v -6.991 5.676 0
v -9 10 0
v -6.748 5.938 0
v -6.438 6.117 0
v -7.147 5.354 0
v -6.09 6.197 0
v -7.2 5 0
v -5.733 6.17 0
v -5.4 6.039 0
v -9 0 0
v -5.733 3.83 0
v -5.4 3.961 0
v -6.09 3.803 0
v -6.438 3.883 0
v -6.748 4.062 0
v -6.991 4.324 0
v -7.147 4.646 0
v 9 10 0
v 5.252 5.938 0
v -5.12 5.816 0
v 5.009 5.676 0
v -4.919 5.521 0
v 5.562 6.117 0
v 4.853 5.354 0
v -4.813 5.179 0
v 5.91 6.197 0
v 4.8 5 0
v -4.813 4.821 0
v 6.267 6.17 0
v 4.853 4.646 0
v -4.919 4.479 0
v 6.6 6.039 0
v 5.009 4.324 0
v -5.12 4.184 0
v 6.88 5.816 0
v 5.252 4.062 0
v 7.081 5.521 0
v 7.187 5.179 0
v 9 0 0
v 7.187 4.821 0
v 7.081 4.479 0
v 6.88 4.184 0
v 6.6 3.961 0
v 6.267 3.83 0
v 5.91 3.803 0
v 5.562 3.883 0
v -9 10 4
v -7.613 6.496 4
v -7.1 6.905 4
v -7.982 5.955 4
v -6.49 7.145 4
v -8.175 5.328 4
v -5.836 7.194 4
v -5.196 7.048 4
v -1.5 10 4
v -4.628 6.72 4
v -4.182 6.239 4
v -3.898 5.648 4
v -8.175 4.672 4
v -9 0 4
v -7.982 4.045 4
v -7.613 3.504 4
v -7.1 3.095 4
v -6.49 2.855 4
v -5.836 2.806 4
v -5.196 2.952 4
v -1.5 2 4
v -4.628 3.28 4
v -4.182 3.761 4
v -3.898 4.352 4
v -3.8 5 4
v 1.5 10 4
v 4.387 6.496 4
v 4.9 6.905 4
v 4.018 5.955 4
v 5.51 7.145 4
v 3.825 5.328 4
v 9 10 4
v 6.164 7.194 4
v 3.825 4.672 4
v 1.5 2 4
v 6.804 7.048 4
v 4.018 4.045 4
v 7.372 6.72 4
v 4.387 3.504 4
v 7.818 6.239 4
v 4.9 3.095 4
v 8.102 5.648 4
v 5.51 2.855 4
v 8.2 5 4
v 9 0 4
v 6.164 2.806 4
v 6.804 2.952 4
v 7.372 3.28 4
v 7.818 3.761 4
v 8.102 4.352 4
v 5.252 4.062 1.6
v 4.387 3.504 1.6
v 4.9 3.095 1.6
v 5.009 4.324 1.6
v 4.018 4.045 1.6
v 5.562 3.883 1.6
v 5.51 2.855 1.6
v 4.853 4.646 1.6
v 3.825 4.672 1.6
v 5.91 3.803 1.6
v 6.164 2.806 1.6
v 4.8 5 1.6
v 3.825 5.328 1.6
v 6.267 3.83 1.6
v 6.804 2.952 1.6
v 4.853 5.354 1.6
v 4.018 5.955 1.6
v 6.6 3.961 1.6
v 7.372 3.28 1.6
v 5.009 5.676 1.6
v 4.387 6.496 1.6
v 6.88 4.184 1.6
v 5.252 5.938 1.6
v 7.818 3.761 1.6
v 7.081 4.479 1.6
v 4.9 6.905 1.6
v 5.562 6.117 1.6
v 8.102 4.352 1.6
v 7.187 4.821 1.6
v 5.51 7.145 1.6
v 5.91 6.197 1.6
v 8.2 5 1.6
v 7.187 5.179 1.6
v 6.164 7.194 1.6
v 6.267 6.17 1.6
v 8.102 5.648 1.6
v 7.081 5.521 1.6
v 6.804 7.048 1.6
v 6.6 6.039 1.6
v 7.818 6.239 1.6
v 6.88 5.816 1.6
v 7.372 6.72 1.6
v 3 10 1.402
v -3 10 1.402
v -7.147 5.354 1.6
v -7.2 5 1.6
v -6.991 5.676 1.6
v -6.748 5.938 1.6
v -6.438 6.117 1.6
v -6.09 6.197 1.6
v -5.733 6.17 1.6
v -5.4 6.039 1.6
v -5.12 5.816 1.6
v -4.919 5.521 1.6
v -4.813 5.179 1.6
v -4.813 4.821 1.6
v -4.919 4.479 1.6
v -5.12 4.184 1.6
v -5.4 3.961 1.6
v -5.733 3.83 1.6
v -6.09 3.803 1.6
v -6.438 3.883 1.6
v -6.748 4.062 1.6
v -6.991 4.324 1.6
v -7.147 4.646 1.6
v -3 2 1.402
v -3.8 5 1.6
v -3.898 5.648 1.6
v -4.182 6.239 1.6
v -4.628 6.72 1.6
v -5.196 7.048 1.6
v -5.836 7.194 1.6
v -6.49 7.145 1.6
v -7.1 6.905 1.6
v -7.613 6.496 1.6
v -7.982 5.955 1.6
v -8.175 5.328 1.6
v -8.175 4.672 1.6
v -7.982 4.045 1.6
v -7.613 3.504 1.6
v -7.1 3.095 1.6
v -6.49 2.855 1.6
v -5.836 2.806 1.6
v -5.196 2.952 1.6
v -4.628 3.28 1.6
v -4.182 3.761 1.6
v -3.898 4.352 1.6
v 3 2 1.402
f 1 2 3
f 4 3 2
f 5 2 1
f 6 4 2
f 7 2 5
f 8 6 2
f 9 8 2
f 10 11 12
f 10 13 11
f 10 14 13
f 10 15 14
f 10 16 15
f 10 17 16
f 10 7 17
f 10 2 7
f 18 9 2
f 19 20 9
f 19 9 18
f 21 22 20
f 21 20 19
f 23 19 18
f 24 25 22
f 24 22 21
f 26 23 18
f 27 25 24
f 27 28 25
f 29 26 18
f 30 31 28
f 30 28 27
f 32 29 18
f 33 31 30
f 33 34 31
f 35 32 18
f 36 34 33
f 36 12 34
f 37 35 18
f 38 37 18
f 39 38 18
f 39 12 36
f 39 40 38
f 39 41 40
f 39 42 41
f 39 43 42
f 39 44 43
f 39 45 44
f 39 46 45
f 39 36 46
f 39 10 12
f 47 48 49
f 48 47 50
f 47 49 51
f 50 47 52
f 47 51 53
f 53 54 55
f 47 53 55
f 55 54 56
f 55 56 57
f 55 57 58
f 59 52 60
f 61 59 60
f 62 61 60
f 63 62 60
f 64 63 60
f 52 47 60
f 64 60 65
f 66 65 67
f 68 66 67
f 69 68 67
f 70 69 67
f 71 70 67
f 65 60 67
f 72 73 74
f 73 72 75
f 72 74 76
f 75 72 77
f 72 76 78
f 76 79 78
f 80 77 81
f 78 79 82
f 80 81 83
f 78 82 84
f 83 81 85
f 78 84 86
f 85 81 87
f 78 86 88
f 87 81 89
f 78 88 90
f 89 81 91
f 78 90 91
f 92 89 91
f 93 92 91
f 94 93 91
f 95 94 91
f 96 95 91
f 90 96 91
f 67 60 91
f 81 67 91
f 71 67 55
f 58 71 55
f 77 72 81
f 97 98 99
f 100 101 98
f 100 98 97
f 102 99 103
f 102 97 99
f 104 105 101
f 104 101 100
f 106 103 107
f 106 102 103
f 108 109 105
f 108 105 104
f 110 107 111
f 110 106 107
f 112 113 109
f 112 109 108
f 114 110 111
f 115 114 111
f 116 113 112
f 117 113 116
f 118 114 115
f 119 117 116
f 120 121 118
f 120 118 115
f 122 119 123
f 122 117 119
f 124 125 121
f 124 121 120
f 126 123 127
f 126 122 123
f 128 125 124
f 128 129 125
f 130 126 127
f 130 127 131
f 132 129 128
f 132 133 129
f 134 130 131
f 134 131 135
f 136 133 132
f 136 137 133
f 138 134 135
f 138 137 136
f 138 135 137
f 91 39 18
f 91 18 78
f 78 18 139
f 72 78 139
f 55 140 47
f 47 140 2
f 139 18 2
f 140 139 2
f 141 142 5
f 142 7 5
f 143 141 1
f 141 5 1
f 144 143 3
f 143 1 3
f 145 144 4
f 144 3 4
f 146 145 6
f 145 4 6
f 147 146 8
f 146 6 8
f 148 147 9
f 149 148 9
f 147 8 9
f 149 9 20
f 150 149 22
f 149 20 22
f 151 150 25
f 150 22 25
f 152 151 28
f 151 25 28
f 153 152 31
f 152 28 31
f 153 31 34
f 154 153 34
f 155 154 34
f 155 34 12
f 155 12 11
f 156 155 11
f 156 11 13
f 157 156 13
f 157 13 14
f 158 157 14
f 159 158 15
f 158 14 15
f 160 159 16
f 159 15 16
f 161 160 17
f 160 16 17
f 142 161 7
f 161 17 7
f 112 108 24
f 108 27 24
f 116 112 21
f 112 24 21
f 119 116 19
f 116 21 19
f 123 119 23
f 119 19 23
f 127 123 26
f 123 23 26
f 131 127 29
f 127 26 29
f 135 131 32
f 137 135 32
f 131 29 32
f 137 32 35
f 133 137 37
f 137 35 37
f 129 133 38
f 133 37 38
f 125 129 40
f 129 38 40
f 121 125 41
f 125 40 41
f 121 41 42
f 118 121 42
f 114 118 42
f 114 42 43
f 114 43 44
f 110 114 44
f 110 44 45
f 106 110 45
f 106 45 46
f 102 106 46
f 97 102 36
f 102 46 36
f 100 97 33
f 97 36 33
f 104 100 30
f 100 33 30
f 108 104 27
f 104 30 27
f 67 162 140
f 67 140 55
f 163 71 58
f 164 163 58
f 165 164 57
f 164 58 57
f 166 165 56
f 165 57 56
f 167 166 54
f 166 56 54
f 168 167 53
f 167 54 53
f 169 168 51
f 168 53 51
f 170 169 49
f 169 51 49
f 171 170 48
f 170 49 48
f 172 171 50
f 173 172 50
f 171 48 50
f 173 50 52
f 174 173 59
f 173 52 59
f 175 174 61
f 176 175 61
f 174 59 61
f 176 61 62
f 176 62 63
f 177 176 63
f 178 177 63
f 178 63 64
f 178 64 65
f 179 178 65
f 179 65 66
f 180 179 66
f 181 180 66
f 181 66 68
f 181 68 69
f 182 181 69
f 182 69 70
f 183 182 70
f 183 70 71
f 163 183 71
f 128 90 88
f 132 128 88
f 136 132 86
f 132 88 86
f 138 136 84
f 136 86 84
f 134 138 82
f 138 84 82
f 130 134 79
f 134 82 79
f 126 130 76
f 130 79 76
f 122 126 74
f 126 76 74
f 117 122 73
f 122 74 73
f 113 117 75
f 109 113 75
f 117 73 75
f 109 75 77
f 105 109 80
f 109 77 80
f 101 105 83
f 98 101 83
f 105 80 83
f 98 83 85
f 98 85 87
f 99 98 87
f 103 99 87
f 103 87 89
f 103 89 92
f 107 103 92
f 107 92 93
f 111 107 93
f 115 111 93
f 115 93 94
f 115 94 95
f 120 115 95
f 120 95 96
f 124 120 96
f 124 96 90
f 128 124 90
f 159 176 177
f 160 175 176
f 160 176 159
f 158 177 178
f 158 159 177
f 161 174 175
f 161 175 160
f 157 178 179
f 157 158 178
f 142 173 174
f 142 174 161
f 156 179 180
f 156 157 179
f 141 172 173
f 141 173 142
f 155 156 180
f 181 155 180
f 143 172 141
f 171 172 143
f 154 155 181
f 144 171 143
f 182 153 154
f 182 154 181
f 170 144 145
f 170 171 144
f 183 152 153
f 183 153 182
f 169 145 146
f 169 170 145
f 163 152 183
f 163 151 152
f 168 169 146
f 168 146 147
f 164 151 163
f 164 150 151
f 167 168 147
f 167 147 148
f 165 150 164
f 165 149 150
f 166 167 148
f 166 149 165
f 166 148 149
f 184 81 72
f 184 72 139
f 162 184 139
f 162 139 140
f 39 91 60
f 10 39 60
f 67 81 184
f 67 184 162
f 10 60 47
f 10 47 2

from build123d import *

# Parameters (mm, degrees)
BOSS_EXTRUDE1_DEPTH                                 = 10
BOSS_EXTRUDE2_DEPTH                                 = 2
CBORE_FOR_M2_HEX_SOCKET_HEAD_CAP_SCREW1_D           = 2.4
CBORE_FOR_M2_HEX_SOCKET_HEAD_CAP_SCREW1_CBORE_D     = 4.4
CBORE_FOR_M2_HEX_SOCKET_HEAD_CAP_SCREW1_CBORE_DEPTH = 2.4


with BuildPart() as part:
    # Sketch1 → Boss-Extrude1 (new body)
    with BuildSketch(Plane(origin=(0, 0, 0), x_dir=(1, 0, 0), z_dir=(0, 1, 0))):
        Polygon((-9, 0), (9, 0), (9, -4), (1.5, -4), (3, -1.401923789), (-3, -1.401923789), (-1.5, -4), (-9, -4), align=None)
    extrude(amount=BOSS_EXTRUDE1_DEPTH)

    # Sketch2 → Boss-Extrude2 (add)
    with BuildSketch(Plane.XZ):
        Polygon((-1.5, 4), (1.5, 4), (3, 1.401923789), (0.56541664, 1.071774791), (-3, 1.401923789), align=None)
    extrude(amount=-BOSS_EXTRUDE2_DEPTH)

    # CBORE for M2 Hex Socket Head Cap Screw1 (through all)
    with Locations(Plane.XY.offset(4)):
        with Locations((-6, 5), (6, 5)):
            CounterBoreHole(CBORE_FOR_M2_HEX_SOCKET_HEAD_CAP_SCREW1_D / 2, CBORE_FOR_M2_HEX_SOCKET_HEAD_CAP_SCREW1_CBORE_D / 2, CBORE_FOR_M2_HEX_SOCKET_HEAD_CAP_SCREW1_CBORE_DEPTH)


solid = part.part
